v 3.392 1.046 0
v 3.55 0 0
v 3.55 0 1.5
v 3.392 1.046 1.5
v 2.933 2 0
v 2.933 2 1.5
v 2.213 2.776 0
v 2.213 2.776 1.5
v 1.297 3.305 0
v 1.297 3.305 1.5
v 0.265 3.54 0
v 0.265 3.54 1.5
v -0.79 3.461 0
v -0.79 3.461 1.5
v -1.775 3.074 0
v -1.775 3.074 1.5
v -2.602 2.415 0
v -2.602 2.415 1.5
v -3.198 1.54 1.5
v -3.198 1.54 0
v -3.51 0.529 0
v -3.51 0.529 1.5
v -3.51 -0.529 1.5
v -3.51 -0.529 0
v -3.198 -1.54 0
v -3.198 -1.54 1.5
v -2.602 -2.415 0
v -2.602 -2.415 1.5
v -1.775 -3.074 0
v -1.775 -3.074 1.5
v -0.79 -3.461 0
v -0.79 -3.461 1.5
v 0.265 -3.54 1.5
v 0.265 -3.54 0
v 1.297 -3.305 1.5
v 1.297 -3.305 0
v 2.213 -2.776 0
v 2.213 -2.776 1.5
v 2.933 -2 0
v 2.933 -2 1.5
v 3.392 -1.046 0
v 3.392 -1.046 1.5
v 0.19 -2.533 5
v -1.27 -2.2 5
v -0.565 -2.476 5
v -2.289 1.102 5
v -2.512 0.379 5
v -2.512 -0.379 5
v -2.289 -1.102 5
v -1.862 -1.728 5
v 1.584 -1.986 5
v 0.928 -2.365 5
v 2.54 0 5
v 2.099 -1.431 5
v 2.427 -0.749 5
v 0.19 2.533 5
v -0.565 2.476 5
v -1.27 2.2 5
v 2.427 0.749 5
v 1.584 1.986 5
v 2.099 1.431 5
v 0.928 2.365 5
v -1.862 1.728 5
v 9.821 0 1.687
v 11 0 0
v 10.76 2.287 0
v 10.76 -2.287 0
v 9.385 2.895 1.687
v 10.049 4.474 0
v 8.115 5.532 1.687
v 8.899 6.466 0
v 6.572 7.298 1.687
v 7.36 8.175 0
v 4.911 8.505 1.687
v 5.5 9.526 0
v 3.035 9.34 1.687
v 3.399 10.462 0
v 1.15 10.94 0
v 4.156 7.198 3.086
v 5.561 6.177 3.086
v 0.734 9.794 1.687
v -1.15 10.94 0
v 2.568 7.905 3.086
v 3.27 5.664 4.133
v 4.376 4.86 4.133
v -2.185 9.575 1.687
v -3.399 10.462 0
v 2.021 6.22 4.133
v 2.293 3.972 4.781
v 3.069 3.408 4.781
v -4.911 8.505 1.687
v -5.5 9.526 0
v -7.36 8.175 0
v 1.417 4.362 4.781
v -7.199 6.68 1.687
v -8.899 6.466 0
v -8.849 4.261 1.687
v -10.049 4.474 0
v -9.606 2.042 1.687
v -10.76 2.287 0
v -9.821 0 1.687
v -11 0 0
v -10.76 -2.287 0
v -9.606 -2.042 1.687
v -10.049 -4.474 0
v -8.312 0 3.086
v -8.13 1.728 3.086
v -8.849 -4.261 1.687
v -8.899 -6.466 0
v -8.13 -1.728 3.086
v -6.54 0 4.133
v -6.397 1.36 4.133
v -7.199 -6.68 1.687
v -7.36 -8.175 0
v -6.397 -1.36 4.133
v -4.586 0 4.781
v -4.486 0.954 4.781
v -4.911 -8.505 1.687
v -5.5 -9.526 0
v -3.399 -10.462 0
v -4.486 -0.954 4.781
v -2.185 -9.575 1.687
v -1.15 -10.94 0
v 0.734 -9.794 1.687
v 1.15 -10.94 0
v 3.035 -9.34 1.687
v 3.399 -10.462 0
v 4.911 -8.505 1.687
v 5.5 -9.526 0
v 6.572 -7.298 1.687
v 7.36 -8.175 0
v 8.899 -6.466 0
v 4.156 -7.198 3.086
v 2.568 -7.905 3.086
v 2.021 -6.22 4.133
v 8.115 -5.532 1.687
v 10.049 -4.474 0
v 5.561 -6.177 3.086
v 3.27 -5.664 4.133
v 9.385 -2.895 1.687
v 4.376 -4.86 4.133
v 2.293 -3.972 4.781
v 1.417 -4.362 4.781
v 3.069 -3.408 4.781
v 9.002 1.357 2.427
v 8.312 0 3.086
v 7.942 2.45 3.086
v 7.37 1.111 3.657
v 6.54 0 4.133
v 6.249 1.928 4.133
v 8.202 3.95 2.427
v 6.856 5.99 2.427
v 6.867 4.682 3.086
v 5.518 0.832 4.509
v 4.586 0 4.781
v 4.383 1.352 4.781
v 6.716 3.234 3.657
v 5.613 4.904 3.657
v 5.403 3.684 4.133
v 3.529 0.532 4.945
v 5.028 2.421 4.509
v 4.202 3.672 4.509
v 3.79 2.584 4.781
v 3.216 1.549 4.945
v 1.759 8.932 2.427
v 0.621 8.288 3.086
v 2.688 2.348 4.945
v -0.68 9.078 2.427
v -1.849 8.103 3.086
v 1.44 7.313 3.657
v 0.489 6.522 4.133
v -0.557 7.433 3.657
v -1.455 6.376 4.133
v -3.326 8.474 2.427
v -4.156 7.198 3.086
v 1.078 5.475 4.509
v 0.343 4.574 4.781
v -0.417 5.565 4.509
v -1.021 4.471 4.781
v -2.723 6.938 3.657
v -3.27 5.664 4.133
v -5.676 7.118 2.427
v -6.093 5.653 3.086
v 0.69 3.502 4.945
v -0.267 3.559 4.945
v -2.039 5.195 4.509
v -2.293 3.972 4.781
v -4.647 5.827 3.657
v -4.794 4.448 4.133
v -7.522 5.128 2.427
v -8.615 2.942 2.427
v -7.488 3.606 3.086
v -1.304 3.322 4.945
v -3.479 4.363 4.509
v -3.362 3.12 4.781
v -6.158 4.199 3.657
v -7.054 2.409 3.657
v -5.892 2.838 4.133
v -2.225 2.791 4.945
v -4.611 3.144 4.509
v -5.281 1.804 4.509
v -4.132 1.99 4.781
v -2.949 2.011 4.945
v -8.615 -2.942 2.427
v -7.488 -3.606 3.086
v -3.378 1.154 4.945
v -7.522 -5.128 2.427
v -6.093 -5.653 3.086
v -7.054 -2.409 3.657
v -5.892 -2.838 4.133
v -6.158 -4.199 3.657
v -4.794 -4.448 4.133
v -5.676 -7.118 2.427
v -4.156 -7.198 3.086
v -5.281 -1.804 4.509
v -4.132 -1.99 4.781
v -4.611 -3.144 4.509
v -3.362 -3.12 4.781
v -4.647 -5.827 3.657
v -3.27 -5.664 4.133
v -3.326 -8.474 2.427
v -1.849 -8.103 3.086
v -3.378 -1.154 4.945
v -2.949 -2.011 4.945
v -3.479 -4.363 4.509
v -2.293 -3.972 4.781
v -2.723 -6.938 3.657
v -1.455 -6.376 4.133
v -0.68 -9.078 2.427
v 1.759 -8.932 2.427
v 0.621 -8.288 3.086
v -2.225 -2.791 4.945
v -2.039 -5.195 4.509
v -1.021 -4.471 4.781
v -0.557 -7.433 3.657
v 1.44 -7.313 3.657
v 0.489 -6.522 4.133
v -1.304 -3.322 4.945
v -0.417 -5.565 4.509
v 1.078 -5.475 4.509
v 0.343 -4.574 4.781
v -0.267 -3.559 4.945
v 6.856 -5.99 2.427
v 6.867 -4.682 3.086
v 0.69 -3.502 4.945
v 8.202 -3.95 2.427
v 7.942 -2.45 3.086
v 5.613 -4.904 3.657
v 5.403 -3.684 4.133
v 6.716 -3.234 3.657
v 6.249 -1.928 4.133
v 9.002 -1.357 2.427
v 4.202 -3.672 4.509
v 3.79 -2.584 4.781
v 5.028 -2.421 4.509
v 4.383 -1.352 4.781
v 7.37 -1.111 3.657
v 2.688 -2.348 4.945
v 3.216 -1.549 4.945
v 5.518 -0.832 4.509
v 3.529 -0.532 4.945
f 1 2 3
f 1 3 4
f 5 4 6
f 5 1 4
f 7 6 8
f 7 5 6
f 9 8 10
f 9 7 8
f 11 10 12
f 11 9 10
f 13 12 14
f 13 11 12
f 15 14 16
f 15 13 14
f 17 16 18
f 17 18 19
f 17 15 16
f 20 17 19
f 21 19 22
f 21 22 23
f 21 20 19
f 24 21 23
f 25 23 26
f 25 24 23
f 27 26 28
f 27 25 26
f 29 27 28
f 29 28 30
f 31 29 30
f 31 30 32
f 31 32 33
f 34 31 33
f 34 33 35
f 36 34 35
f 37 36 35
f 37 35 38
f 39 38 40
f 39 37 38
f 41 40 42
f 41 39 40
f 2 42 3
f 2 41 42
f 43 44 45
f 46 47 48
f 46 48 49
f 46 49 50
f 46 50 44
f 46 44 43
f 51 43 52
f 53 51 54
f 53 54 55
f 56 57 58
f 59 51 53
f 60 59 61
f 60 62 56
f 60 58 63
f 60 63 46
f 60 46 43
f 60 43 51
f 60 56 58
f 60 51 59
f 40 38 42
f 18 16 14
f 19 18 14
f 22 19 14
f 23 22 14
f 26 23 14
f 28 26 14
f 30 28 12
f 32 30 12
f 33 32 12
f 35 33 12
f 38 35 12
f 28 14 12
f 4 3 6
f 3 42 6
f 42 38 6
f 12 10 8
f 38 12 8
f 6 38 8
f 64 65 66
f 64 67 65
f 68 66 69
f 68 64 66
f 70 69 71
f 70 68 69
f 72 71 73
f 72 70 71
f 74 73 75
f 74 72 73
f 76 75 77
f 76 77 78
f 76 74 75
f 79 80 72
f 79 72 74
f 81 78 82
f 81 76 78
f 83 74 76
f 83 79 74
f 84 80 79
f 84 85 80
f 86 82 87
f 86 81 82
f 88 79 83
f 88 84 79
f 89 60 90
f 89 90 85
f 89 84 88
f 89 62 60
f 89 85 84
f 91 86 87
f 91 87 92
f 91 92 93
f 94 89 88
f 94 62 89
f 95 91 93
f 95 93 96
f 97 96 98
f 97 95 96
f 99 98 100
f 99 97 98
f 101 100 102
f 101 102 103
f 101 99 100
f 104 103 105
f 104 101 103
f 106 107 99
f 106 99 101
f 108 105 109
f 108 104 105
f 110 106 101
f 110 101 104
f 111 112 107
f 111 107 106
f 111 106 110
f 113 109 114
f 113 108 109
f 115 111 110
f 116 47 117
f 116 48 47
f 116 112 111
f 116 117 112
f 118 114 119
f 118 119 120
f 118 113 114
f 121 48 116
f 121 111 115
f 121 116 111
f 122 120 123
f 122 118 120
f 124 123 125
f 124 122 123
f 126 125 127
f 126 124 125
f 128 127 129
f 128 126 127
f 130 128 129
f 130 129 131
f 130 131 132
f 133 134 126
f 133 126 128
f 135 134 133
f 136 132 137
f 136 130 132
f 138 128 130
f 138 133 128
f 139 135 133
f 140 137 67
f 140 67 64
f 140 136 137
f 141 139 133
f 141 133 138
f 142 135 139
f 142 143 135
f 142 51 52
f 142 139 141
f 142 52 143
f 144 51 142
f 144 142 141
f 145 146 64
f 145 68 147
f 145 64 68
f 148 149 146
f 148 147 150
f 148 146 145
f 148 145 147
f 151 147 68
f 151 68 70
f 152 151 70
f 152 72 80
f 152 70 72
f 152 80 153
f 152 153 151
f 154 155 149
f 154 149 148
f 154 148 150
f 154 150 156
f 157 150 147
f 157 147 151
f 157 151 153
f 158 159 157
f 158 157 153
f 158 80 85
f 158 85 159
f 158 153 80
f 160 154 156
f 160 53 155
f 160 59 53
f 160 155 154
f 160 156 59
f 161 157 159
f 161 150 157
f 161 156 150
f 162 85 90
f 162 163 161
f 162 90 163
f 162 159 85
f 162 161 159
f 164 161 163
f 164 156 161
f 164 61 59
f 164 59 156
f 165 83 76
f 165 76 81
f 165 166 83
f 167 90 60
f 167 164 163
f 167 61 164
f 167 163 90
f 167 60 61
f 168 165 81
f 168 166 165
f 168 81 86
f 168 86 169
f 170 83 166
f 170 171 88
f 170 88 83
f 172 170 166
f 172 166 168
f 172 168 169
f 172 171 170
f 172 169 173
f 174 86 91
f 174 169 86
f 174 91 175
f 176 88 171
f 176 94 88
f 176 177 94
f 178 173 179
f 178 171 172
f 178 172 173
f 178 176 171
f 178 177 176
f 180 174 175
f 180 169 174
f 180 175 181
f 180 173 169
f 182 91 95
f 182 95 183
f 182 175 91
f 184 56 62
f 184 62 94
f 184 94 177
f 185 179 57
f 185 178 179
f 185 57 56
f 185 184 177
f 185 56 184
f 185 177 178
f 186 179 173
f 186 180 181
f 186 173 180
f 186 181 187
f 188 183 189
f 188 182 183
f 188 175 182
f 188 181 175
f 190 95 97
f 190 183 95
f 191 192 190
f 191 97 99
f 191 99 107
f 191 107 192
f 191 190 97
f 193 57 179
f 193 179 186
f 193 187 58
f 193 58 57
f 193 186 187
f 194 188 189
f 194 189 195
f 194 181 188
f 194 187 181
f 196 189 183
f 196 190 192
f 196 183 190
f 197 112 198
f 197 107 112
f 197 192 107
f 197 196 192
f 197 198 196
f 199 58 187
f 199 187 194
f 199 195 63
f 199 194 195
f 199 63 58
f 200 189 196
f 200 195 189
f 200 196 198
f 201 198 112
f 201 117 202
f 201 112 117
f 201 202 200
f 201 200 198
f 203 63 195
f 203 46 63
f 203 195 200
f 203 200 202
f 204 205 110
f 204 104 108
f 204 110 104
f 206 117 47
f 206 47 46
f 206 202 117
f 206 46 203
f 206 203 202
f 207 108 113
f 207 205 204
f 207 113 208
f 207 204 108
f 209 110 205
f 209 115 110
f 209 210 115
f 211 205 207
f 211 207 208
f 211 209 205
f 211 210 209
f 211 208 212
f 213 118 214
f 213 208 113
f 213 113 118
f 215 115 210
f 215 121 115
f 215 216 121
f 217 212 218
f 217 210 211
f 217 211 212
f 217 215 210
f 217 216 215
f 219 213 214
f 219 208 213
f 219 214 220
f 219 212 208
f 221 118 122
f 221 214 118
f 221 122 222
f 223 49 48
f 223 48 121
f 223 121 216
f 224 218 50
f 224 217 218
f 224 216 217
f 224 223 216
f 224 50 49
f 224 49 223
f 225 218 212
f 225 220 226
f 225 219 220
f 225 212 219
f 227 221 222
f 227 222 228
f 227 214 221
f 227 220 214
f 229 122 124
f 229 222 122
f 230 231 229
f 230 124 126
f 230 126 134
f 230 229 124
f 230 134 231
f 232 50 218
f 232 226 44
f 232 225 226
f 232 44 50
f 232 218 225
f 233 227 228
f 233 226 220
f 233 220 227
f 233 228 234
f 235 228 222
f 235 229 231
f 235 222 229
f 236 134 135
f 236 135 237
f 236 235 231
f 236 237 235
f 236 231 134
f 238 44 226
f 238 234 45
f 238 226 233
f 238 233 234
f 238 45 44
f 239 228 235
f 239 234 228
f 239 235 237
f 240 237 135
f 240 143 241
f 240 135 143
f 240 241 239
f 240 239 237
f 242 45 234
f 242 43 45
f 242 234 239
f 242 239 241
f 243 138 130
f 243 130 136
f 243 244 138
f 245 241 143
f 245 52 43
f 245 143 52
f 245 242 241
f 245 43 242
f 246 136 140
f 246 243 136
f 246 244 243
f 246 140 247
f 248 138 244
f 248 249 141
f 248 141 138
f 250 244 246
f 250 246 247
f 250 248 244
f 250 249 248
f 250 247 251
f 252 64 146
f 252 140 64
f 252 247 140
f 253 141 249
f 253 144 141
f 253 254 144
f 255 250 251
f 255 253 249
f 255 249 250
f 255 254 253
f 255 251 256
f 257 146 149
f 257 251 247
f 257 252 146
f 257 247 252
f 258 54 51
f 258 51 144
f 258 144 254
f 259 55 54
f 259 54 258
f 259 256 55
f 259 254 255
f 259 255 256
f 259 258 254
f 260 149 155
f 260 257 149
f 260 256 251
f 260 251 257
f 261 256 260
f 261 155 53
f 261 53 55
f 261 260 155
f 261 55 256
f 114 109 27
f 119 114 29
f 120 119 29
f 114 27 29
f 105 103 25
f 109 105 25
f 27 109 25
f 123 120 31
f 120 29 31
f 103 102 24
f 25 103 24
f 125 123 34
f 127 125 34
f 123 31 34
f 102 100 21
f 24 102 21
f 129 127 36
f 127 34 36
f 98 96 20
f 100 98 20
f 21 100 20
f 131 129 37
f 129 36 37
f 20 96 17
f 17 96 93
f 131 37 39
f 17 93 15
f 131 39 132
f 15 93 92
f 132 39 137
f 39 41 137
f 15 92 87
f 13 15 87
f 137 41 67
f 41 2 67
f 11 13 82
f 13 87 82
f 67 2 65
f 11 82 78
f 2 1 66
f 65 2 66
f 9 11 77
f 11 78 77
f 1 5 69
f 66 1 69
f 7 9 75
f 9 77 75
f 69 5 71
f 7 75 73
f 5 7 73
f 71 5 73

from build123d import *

# Parameters (mm, degrees)
F0_R     = 11
F1_DEPTH = 5
F3_R     = 3.55
F4_DEPTH = 1.5


# Not quite as in the source:
# - a fillet or chamfer that OpenCascade refuses, or shapes differently, is made with other operations: its cross-section is extruded or revolved along the edge and cut away or added


with BuildPart() as f1:
    # F0 (on Top) → F1 (new body)
    with BuildSketch(Plane.XY):
        Circle(F0_R)
    extrude(amount=F1_DEPTH)

    # F2: fillet of radius 9.6568542495 on 1 edges, made by hand

    # F2_s1 → F2_t2 (revolve, cut)
    with BuildSketch(Plane.XZ):
        with BuildLine():
            ThreePointArc((11, 0), (7.4536454326, 3.6565504906), (2.5401807055, 5))
            Line((2.5401807055, 5), (11, 5))
            Line((11, 5), (11, 0))
        make_face()
    revolve(axis=Axis((0, 0, 5), (0, 0, 1)), mode=Mode.SUBTRACT)

    # F3 (on Top) → F4 (cut)
    with BuildSketch(Plane.XY):
        Circle(F3_R)
    extrude(amount=F4_DEPTH, mode=Mode.SUBTRACT)


solid = f1.part
